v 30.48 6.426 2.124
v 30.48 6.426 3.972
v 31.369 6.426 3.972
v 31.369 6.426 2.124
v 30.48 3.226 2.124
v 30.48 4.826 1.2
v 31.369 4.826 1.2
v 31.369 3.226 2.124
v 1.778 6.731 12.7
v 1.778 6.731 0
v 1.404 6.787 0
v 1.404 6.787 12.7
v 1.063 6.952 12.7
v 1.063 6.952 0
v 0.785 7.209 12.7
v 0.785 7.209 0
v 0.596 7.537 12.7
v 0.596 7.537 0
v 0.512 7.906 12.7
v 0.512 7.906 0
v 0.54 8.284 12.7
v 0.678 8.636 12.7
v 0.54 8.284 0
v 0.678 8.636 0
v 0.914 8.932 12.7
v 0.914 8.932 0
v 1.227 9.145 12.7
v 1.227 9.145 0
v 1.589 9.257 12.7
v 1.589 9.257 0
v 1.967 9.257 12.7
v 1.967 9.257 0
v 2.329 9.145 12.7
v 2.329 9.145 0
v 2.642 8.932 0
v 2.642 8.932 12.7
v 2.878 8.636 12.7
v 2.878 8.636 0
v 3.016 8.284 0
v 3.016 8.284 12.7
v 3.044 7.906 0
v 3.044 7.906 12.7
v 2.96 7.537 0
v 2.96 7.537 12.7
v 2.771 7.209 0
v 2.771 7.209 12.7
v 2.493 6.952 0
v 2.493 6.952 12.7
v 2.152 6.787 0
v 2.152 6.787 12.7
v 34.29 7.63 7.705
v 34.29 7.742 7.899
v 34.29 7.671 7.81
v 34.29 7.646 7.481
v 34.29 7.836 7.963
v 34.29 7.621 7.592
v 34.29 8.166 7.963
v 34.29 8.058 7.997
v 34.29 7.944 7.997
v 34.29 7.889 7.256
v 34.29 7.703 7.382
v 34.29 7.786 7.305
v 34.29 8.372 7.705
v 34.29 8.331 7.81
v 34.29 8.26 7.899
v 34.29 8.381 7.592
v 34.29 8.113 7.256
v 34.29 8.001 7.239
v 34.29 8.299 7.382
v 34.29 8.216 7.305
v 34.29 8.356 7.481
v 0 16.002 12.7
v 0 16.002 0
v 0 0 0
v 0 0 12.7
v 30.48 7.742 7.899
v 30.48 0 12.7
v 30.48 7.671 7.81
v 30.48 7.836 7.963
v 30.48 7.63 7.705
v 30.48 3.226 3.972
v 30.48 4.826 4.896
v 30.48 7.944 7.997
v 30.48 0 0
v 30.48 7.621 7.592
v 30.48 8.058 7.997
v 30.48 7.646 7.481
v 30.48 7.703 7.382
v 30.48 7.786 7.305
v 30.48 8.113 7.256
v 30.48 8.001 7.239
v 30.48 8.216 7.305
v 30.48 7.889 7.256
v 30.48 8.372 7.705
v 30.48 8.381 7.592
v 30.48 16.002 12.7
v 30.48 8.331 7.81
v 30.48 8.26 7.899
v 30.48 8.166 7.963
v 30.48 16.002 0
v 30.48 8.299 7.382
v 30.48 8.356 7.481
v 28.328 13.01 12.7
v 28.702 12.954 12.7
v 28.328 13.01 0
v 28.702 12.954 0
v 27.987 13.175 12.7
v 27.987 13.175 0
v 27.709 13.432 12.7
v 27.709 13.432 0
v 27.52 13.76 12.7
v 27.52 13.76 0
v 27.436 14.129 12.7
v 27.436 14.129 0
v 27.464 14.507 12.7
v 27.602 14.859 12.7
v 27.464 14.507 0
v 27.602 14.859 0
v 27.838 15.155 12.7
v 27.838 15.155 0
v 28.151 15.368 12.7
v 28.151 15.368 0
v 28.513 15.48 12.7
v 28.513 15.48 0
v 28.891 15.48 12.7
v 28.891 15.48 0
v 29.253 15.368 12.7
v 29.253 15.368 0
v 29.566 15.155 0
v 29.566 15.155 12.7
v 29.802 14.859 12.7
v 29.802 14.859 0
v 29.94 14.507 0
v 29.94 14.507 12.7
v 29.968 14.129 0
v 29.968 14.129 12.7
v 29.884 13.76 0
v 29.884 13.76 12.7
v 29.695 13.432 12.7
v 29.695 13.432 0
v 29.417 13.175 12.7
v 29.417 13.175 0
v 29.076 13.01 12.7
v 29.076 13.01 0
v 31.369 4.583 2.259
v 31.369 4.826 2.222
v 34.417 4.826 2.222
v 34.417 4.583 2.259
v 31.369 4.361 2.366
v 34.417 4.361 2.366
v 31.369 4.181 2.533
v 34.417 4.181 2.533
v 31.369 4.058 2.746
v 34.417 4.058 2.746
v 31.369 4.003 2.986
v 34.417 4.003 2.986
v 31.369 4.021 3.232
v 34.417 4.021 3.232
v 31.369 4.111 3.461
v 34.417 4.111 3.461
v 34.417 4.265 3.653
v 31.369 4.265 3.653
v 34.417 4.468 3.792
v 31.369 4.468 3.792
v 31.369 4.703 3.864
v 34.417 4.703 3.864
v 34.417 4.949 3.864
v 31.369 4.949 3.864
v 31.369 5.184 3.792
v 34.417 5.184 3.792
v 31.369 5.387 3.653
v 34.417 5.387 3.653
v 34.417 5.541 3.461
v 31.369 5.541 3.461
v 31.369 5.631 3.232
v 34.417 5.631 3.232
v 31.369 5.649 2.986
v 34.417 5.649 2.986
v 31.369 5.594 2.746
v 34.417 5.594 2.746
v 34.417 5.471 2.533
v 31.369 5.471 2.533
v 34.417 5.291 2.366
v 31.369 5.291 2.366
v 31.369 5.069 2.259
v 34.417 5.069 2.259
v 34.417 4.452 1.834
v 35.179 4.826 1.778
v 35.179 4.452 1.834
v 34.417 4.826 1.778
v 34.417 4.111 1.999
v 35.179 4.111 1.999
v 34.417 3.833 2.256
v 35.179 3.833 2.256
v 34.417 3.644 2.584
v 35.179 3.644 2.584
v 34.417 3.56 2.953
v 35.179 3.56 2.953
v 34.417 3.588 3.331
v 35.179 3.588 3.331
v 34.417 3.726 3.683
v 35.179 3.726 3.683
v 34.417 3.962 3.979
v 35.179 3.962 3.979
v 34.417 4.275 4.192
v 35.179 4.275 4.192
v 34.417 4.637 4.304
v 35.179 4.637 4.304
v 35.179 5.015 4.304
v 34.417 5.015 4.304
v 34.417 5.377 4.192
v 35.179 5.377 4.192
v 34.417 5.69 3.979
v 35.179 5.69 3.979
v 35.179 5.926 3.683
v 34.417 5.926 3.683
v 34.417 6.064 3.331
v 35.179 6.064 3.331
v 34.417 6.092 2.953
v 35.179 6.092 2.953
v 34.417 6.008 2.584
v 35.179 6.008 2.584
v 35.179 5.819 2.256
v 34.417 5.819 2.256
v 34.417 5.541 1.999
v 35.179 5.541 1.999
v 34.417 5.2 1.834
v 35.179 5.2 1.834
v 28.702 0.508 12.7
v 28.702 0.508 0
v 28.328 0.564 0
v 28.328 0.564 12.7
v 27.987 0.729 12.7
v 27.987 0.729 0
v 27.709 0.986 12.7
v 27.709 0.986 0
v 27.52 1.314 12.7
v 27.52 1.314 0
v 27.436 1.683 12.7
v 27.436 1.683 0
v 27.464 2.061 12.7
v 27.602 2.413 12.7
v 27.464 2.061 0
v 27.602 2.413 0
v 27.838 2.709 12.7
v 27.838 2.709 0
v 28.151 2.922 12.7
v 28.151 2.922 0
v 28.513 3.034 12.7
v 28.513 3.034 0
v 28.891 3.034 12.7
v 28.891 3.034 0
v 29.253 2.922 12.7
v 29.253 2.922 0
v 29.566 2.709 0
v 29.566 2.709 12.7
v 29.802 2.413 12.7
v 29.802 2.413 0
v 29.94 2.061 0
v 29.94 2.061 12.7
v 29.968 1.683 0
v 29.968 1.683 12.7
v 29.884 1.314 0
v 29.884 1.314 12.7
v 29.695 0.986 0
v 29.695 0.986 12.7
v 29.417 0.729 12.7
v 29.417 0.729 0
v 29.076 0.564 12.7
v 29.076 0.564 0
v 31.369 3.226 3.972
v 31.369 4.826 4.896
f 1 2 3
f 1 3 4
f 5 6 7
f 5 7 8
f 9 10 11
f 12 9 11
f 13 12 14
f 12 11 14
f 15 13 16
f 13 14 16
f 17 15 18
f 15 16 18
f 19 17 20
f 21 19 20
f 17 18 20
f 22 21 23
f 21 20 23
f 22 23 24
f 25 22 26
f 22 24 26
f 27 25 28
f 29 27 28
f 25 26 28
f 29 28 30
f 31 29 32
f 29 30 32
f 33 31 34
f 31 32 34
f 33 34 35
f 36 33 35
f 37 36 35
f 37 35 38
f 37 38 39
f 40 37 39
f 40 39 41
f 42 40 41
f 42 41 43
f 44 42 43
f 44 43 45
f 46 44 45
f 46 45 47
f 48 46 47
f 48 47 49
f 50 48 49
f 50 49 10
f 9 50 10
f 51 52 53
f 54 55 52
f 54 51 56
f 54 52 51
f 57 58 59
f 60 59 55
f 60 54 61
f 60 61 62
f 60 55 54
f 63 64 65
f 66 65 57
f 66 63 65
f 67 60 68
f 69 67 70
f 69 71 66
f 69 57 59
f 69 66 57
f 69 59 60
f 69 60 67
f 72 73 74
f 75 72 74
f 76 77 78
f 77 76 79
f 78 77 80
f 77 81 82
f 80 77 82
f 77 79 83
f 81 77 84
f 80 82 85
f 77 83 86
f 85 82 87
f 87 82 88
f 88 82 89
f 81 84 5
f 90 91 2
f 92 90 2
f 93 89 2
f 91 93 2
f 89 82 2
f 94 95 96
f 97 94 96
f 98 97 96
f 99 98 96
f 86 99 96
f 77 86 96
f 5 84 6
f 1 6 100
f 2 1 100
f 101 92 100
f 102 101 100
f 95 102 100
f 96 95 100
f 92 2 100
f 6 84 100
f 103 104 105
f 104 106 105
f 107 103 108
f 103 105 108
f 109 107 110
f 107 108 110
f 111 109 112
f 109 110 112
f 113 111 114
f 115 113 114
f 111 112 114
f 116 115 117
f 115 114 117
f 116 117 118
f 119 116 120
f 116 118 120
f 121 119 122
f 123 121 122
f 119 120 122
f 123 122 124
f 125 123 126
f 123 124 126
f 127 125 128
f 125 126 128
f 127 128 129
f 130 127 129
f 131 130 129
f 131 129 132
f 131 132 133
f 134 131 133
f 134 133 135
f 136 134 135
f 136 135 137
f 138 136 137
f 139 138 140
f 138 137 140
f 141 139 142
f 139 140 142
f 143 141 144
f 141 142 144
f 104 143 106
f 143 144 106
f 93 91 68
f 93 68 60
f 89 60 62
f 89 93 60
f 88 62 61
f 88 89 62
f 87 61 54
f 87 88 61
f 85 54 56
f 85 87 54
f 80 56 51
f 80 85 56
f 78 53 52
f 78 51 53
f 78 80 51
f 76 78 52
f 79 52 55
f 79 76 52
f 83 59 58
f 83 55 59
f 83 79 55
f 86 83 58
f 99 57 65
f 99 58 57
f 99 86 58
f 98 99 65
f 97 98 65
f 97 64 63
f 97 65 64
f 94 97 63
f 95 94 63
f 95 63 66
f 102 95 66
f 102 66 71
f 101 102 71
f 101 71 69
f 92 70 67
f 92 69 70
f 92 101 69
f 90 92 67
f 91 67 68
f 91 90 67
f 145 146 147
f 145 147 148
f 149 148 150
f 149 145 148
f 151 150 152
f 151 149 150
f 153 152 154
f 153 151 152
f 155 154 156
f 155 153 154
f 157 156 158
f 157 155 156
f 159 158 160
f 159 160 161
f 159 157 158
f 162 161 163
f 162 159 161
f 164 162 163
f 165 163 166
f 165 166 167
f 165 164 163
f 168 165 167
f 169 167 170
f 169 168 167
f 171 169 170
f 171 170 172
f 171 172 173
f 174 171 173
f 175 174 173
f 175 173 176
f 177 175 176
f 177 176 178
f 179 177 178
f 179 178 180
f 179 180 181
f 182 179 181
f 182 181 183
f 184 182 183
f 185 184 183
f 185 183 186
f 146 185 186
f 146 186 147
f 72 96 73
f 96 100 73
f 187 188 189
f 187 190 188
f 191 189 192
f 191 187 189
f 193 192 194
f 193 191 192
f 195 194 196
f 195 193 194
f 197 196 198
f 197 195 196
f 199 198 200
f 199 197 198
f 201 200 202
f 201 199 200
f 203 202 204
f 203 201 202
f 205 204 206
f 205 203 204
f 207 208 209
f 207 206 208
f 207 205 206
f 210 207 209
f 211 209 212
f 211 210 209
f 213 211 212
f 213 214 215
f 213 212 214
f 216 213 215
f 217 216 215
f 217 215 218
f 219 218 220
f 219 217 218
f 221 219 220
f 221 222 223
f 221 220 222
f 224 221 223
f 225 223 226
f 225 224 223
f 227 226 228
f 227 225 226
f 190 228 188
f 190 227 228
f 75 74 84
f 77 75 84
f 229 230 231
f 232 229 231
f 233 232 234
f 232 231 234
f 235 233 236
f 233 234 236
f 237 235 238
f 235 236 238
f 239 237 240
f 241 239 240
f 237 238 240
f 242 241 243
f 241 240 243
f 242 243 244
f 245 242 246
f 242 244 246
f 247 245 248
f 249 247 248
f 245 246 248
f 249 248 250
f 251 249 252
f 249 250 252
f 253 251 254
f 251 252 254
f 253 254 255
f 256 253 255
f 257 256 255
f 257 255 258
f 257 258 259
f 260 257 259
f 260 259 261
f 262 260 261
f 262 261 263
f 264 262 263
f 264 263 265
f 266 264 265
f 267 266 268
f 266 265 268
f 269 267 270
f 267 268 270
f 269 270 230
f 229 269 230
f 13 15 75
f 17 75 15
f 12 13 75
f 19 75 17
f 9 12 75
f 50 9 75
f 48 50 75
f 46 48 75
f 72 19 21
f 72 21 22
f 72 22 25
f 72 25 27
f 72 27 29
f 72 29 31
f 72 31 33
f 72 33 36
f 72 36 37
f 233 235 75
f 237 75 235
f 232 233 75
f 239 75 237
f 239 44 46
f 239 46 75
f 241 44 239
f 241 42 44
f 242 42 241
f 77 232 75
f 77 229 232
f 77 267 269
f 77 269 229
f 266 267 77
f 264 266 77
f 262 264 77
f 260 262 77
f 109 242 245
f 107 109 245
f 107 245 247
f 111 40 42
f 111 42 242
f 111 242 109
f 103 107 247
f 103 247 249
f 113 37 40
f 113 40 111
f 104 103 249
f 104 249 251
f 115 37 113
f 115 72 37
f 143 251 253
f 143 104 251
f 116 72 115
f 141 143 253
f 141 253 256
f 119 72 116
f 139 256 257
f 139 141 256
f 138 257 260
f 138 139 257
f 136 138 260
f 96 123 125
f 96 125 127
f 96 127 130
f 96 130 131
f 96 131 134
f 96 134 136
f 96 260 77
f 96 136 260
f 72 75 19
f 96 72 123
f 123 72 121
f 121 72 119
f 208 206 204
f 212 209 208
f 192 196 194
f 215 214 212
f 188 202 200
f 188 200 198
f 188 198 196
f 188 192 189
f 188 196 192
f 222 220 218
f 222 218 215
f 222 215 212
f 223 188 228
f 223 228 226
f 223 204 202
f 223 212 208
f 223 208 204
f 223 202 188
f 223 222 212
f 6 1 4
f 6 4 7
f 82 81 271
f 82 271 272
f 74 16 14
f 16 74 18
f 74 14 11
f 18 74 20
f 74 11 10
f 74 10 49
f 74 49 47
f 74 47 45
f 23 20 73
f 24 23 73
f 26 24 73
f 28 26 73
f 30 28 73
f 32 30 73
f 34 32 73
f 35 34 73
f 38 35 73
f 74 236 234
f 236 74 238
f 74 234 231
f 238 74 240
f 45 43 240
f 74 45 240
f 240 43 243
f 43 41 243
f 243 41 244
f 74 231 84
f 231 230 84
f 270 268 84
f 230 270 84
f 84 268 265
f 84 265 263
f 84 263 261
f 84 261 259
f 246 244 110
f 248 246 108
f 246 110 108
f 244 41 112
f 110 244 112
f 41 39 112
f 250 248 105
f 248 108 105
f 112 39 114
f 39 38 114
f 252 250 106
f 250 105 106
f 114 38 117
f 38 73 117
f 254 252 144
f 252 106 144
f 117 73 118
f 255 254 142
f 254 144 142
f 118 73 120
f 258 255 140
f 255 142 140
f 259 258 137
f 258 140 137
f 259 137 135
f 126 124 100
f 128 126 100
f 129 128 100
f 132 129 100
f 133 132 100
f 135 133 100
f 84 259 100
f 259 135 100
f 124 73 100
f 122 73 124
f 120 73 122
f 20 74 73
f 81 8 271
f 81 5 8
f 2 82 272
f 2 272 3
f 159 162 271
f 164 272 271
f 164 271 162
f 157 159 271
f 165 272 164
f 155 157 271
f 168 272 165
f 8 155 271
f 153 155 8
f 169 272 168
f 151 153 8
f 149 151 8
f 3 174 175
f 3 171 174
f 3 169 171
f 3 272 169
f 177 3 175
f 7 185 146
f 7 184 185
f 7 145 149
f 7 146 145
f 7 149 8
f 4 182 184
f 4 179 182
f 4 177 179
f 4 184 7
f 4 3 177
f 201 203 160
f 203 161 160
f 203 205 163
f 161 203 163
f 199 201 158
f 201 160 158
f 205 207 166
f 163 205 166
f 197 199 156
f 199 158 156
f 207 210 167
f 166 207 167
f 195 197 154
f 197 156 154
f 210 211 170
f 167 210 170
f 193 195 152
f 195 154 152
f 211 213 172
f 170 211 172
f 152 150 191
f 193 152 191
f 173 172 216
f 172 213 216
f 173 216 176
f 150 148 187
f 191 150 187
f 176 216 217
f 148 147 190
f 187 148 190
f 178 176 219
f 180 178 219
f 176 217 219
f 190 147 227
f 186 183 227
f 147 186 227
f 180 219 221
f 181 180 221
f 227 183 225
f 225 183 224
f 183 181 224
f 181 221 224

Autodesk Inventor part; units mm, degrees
ref_plane "YZ Plane" through (0, 0, 0) normal (1, 0, 0) x (0, 1, 0)
ref_plane "XZ Plane" through (0, 0, 0) normal (0, 1, 0) x (-1, 0, 0)
ref_plane "XY Plane" through (0, 0, 0) normal (0, 0, 1) x (1, 0, 0)
sketch "Sketch1" plane through (0, 0, 0) normal (0, 0, 1) x (1, 0, 0)
  line L0 (0, 0) -> (30.48, 0)
  line L1 (30.48, 0) -> (30.48, 16.002)
  line L2 (30.48, 16.002) -> (0, 16.002)
  line L3 (0, 16.002) -> (0, 0)
  dimension "d0" = 30.48
  dimension "d1" = 16.002
extrude "Extrusion1" add sketch "Sketch1" along normal blind 12.7
sketch "Sketch2" plane through (0, 0, 12.7) normal (0, 0, 1) x (1, 0, 0)
  line L0 (0, 0) -> (30.48, 0) projected
  line L1 (0, 16.002) -> (0, 0) projected
  point P0 (1.778, 8.001)
  point P1 (28.702, 14.224)
  point P2 (28.702, 1.778)
  dimension "d4" = 26.924
  dimension "d5" = 8.001
  dimension "d6" = 1.778
  dimension "d7" = 1.778
  dimension "d8" = 12.446
hole "Hole1" at (1.778, 8.001, 12.7) at (28.702, 14.224, 12.7) at (28.702, 1.778, 12.7) direction (0, 0, -1) diameter 2.54 end through all
sketch "Sketch3" plane through (30.48, 0, 0) normal (1, 0, 0) x (0, 0, -1)
  circle A0 centre (-7.62, 8.001) radius 0.381
  line L0 (-12.7, 0) -> (-12.7, 16.002) projected
  line L1 (0, 0) -> (-12.7, 0) projected
  dimension "d17" = 0.762
  dimension "d18" = 5.08
  dimension "d19" = 8.001
extrude "Extrusion2" add sketch "Sketch3" along normal blind 3.81
sketch "Sketch4" plane through (30.48, 0, 0) normal (1, 0, 0) x (0, 0, -1)
  line L0 (-4.8958, 4.826) -> (-3.9719, 6.4262)
  line L1 (-3.9719, 6.4262) -> (-2.1241, 6.4262)
  line L2 (-2.1241, 6.4262) -> (-1.2002, 4.826)
  line L3 (-1.2002, 4.826) -> (-2.1241, 3.2258)
  line L4 (-2.1241, 3.2258) -> (-3.9719, 3.2258)
  line L5 (-3.9719, 3.2258) -> (-4.8958, 4.826)
  line L6 (-3.9719, 3.2258) -> (-2.1241, 6.4262) construction
  line L7 (-2.1241, 3.2258) -> (-3.9719, 6.4262) construction
  line L8 (-12.7, 0) -> (-12.7, 16.002) projected
  line L9 (0, 0) -> (-12.7, 0) projected
  point P0 (-3.048, 4.826)
  point P1 (-3.048, 4.826)
  dimension "d22" = 120
  dimension "d23" = 9.652
  dimension "d24" = 4.826
  dimension "d25" = 3.2004
extrude "Extrusion3" add sketch "Sketch4" along normal blind 0.889
sketch "Sketch5" plane through (31.369, 0, 0) normal (1, 0, 0) x (0, 0, -1)
  line L0 (-3.9719, 3.2258) -> (-2.1241, 3.2258) projected
  line L1 (-1.2002, 4.826) -> (-2.1241, 6.4262) projected
  line L2 (-3.9719, 3.2258) -> (-2.1241, 6.4262)
  line L3 (-1.2002, 4.826) -> (-4.8958, 4.826)
  circle A0 centre (-3.048, 4.826) radius 0.8255
  point P0 (0, 0)
  dimension "d28" = 1.651
extrude "Extrusion4" add sketch "Sketch5" along normal blind 3.048 contours A0 L2 L3 | L3 L2 A0 | L2 L3 A0 | L2 A0 L3
sketch "Sketch6" plane through (34.417, 4.826, 3.048) normal (1, 0, 0) x (0, 0, -1)
  circle A0 centre (0, 0) radius 1.27
  circle A1 centre (0, 0) radius 0.8255 projected
  point P0 (3.048, -4.826)
  dimension "d31" = 2.54
extrude "Extrusion5" add sketch "Sketch6" along normal blind 0.762 contours A0 | A1
properties part number "BTBody"
